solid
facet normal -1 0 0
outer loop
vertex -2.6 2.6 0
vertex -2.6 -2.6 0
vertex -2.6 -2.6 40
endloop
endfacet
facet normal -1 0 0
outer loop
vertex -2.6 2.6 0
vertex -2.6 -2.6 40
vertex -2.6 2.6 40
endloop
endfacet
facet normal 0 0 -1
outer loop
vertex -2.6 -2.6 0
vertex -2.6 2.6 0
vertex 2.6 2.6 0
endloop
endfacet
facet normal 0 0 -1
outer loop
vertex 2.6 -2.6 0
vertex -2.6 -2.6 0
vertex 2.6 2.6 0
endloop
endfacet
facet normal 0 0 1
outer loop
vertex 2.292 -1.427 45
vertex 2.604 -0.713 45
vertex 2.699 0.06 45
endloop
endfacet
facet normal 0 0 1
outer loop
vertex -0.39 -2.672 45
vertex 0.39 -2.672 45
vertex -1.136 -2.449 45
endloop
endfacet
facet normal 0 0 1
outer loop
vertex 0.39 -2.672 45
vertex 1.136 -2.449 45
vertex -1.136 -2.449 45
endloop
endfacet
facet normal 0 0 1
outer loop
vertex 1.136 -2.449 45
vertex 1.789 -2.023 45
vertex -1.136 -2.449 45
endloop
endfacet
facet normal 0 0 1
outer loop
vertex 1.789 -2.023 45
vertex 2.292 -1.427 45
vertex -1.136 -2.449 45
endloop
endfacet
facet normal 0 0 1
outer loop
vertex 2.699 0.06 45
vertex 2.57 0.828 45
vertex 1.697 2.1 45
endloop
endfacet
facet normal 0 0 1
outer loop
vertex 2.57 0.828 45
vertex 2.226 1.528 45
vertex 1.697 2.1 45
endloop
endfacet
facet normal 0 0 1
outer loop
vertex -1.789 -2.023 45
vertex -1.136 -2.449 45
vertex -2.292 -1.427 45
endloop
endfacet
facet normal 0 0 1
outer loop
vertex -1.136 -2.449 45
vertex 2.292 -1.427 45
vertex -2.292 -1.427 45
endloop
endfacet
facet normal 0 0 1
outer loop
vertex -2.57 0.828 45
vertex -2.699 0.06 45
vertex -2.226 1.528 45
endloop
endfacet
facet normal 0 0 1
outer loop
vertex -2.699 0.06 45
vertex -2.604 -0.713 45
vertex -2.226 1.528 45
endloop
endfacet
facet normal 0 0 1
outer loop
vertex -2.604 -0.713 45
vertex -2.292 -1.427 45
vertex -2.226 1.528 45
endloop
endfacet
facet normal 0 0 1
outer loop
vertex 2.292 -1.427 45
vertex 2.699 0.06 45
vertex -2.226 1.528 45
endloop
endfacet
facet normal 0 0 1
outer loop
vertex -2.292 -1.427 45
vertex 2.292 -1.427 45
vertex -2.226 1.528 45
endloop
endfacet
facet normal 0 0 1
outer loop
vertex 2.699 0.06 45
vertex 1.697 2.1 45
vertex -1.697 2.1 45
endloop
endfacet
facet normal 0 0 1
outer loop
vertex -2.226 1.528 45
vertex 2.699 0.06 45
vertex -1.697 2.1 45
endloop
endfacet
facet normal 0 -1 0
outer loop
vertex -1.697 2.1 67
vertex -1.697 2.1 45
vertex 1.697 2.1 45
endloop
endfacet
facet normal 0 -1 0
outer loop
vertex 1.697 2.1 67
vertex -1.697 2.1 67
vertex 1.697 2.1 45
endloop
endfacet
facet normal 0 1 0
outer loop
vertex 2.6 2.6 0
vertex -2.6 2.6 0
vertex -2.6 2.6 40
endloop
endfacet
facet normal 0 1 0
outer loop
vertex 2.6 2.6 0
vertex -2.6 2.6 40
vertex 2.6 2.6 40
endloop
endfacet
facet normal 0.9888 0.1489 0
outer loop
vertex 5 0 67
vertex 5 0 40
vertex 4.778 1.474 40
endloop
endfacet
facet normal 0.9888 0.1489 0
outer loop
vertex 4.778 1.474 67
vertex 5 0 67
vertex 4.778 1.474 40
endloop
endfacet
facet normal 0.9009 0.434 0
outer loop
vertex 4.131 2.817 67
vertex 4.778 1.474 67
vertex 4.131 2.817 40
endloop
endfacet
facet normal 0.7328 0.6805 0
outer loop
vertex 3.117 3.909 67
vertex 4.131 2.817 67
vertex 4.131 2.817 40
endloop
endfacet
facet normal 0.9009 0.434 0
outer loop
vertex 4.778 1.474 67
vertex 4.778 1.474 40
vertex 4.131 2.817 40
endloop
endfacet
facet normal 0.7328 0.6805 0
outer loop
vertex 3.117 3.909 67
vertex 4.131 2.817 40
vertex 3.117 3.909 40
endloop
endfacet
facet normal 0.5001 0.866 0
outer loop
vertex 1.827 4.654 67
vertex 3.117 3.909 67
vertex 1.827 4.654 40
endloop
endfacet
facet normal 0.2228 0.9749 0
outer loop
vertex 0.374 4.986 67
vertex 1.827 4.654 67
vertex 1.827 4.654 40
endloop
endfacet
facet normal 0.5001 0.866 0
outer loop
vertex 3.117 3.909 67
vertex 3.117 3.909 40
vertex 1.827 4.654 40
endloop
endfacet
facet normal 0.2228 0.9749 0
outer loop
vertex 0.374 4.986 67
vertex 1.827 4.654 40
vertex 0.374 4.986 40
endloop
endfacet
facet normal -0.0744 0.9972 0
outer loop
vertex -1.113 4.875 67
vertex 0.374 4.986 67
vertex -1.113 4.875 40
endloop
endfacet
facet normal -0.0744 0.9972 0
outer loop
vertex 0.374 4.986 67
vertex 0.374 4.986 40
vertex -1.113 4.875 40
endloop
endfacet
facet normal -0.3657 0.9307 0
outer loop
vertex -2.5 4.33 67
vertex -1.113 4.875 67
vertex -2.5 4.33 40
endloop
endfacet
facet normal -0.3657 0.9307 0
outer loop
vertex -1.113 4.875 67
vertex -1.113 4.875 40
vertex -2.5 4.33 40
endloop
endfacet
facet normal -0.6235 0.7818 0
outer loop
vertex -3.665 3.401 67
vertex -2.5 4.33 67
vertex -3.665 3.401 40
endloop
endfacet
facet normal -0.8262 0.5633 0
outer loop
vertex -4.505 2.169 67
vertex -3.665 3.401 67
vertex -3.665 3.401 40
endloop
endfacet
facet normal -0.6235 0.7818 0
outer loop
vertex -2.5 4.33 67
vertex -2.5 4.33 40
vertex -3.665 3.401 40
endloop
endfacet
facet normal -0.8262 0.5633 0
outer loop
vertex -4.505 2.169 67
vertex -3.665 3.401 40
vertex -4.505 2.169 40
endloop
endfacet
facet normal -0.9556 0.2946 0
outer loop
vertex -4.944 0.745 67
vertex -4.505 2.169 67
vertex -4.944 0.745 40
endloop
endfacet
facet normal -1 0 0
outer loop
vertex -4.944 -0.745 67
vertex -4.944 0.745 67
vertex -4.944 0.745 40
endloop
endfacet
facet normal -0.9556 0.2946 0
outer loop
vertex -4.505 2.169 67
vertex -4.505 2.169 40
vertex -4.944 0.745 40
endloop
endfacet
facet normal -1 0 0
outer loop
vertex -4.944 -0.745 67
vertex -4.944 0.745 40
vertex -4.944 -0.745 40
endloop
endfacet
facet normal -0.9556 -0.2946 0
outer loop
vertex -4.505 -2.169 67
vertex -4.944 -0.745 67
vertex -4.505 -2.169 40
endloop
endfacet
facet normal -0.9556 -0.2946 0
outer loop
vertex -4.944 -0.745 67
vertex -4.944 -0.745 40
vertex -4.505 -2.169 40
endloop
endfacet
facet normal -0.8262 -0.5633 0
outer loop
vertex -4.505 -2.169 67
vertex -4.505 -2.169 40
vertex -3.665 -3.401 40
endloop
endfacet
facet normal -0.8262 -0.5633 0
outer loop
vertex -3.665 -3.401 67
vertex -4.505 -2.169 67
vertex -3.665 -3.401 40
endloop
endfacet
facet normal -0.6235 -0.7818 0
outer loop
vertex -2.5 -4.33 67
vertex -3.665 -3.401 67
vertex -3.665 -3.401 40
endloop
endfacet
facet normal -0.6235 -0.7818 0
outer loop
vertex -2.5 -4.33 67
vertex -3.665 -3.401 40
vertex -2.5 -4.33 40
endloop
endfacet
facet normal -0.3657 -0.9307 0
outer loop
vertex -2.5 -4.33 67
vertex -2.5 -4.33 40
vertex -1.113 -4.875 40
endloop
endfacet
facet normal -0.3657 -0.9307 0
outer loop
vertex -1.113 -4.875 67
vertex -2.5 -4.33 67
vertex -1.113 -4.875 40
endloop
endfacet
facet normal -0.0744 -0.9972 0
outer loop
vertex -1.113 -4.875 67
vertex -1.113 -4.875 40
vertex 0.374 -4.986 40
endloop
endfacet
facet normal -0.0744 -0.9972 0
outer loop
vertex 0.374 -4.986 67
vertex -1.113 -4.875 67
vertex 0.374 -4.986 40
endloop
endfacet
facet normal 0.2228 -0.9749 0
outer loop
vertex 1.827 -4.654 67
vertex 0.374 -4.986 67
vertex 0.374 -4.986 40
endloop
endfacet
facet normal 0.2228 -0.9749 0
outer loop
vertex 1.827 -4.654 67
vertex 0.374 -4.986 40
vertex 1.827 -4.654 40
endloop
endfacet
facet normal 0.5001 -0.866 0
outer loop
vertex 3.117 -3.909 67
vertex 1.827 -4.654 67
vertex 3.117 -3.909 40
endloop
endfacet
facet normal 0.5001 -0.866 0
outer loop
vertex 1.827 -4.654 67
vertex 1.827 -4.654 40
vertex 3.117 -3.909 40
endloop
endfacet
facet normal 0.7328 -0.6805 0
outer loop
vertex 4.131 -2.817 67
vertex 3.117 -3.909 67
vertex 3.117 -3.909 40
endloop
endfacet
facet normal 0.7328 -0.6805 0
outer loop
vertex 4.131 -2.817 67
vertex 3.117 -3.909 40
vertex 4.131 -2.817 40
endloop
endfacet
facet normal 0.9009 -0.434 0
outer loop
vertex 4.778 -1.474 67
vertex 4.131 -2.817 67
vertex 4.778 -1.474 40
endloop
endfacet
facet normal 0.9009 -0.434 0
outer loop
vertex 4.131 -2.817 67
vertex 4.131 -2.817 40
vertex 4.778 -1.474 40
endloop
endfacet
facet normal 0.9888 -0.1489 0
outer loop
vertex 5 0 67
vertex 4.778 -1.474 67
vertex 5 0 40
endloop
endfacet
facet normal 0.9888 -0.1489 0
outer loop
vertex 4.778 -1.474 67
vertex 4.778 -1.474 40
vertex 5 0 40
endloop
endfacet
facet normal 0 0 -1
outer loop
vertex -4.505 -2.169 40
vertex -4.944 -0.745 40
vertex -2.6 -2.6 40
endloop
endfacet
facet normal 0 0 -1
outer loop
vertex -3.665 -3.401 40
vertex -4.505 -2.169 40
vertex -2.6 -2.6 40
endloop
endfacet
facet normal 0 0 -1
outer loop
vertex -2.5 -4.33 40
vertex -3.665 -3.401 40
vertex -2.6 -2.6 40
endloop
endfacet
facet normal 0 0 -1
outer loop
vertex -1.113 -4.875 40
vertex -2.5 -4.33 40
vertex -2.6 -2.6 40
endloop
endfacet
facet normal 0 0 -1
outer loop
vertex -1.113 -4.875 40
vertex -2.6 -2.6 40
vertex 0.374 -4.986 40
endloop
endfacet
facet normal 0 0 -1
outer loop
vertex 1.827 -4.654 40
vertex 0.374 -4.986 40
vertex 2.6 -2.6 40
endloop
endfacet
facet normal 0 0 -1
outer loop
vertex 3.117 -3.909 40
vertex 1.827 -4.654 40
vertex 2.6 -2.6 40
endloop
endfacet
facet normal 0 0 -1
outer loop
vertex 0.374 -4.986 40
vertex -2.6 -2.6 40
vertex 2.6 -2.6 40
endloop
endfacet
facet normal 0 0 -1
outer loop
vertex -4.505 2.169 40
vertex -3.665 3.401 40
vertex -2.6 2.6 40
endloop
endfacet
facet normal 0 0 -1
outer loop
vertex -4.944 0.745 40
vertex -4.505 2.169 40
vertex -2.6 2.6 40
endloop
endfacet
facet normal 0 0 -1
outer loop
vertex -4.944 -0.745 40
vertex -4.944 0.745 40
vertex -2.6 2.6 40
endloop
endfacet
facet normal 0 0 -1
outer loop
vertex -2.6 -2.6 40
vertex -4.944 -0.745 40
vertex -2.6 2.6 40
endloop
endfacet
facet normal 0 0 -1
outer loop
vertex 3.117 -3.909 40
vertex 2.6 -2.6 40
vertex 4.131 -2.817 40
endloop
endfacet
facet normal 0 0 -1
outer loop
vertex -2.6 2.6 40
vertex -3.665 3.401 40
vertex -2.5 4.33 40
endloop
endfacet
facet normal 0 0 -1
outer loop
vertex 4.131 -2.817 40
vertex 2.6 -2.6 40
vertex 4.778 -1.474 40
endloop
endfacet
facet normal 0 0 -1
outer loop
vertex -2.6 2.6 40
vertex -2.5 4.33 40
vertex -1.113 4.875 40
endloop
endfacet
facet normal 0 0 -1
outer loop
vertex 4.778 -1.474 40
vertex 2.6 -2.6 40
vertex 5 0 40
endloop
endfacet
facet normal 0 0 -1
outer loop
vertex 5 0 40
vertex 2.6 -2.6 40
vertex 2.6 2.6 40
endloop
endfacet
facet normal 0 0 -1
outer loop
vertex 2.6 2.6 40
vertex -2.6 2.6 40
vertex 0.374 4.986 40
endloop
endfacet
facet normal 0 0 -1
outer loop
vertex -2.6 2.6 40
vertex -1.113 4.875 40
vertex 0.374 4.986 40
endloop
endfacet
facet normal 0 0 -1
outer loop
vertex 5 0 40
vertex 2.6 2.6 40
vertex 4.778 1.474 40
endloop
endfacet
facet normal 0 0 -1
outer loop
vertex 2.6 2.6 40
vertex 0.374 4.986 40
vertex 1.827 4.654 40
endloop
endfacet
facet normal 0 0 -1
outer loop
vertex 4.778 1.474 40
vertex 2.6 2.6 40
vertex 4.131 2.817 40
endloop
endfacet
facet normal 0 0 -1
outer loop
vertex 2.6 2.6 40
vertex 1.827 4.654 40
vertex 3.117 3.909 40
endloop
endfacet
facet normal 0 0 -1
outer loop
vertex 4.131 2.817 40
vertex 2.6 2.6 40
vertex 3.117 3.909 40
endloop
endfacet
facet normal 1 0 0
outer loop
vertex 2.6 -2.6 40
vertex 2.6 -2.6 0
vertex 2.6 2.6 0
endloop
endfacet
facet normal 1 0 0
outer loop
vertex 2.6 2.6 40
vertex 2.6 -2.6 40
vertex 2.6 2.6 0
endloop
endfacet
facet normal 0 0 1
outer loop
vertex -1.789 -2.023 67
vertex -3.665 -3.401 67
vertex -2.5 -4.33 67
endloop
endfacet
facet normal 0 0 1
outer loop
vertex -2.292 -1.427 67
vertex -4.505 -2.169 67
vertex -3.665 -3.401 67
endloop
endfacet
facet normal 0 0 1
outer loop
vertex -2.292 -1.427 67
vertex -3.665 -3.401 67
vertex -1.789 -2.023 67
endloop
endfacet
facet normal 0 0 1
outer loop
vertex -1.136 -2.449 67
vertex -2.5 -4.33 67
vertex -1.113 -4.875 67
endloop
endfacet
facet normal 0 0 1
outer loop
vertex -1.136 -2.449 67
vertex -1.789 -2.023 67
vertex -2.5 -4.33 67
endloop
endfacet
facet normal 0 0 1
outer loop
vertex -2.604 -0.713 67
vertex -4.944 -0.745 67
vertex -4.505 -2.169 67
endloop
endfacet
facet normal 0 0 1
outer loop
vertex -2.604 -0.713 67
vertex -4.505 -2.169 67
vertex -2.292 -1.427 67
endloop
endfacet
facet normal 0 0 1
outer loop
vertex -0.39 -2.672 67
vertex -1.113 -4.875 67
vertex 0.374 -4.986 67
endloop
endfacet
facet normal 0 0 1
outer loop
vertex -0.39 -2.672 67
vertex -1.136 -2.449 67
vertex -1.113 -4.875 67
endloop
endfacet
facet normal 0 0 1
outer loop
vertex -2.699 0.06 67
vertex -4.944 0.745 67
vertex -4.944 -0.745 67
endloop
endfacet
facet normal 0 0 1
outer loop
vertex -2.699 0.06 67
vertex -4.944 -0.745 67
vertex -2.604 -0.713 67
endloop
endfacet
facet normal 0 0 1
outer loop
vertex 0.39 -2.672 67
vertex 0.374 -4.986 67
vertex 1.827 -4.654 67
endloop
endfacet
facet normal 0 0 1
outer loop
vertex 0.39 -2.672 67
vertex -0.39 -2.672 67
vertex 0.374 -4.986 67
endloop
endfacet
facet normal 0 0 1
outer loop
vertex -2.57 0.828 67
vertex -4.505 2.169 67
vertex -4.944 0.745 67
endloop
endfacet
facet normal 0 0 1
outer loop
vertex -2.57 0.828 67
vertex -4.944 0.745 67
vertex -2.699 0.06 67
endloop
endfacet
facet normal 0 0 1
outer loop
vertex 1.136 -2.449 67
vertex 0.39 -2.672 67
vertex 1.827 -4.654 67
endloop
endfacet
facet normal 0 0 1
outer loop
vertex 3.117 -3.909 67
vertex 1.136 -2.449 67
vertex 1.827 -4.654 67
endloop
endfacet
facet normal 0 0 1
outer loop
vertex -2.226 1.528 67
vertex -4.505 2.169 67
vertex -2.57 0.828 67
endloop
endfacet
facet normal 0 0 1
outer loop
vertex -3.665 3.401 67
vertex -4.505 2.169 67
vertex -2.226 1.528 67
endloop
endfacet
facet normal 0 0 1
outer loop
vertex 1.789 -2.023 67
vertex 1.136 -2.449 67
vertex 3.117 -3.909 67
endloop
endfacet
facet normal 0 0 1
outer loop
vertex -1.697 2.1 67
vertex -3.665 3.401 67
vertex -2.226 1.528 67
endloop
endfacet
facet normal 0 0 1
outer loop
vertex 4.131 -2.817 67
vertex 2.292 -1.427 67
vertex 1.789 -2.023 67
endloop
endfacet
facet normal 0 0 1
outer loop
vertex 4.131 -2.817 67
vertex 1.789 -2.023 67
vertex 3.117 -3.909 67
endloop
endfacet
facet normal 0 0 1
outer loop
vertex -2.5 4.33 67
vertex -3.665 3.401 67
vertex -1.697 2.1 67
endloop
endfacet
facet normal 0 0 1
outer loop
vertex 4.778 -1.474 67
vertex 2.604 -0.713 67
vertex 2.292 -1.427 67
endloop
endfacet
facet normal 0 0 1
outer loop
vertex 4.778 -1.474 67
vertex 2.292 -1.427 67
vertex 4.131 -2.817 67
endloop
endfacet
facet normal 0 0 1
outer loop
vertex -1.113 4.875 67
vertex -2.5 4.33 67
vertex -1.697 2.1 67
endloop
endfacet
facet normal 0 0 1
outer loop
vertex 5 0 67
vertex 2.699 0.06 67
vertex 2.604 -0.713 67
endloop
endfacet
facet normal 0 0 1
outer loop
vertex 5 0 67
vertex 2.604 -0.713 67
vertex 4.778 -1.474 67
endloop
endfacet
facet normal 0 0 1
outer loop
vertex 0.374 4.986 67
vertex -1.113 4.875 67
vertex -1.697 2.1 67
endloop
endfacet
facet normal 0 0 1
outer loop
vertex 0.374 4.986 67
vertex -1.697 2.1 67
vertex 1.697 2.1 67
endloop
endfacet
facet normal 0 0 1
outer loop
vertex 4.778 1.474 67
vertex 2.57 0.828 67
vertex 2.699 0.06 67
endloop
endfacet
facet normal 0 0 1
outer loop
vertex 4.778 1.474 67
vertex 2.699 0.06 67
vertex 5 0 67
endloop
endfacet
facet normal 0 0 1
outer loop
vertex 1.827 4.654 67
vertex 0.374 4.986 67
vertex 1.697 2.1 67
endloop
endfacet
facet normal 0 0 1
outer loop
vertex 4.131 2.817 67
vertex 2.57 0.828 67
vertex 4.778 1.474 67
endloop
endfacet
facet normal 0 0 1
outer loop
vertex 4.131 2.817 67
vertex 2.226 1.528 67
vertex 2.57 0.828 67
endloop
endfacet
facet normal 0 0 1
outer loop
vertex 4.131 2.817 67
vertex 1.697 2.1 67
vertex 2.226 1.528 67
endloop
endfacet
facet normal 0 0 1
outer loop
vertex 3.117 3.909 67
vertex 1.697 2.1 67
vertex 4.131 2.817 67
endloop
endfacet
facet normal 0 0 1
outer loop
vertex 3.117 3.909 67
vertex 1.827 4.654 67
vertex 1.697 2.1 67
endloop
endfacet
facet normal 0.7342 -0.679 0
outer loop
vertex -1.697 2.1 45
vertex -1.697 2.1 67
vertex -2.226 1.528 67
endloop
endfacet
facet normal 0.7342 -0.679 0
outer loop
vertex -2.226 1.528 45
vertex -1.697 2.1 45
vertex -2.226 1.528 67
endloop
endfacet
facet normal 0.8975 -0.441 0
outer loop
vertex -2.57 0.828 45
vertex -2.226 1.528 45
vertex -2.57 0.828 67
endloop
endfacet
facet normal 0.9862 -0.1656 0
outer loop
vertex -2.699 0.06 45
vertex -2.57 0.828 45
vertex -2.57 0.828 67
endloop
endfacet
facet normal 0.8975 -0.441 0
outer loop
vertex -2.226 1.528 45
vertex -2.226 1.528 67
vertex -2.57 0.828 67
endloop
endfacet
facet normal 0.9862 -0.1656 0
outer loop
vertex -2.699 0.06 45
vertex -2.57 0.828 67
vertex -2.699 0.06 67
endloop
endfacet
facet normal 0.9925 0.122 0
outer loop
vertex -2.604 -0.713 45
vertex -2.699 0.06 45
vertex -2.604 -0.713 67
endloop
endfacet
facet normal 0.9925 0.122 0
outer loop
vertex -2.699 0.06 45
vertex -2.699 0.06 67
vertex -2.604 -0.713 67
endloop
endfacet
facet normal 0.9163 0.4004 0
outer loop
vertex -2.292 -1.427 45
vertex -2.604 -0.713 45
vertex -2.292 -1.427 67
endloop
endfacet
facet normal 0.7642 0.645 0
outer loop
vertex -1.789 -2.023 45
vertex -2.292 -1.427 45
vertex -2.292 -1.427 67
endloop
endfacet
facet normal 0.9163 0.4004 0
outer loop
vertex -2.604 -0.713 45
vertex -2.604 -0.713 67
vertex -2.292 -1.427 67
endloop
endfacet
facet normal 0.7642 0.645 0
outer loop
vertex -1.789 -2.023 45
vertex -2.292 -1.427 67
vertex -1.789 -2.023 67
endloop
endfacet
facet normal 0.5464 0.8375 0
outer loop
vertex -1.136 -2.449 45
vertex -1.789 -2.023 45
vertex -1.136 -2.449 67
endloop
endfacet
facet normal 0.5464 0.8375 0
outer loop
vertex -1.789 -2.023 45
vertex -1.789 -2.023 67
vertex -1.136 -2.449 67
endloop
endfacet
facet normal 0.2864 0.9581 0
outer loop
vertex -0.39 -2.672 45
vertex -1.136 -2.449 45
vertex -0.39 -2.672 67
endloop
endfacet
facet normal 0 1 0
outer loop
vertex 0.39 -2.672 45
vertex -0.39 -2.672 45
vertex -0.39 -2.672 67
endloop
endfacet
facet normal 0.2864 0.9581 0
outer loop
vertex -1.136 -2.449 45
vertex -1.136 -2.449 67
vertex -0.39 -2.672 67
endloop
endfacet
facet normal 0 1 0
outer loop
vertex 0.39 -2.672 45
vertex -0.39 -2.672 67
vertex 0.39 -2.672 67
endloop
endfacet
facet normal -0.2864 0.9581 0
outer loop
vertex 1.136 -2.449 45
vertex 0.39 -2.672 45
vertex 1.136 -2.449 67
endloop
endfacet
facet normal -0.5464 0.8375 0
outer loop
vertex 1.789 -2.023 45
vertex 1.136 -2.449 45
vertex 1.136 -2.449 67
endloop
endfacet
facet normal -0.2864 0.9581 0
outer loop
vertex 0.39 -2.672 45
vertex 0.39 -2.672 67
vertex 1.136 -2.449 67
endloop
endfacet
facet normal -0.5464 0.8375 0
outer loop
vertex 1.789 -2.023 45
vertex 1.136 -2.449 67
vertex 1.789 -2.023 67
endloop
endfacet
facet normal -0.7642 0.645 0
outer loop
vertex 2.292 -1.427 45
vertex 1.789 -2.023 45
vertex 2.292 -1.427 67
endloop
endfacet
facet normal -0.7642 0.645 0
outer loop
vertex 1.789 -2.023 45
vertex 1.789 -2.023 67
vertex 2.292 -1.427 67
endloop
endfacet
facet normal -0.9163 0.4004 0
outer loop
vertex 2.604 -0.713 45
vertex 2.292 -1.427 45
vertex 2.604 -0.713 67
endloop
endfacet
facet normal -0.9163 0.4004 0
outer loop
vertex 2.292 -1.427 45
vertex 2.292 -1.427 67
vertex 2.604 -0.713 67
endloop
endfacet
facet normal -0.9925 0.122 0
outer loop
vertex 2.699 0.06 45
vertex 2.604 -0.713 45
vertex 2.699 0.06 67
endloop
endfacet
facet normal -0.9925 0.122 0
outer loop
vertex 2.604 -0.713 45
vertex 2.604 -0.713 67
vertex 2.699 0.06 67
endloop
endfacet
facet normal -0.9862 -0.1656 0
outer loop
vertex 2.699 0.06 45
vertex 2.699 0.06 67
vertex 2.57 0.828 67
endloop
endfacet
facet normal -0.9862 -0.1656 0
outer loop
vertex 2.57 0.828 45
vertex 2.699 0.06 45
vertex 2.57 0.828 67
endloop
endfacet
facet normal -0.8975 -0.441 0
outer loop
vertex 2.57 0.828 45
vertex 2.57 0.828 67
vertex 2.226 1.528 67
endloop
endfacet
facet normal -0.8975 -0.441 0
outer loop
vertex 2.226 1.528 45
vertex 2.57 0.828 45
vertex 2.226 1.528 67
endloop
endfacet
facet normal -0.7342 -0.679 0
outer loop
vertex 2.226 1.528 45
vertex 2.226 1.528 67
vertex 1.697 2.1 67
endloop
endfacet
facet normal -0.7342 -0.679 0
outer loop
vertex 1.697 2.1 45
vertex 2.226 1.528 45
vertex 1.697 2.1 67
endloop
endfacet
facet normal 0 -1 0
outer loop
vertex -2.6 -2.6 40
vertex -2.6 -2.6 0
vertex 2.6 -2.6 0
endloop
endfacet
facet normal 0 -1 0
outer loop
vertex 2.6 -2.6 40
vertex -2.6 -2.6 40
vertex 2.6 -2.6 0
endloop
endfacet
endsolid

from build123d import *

# Parameters (mm, degrees)
SKETCH_W     = 5.2
SKETCH_H     = 5.2
PAD_DEPTH    = 40
SKETCH001_R  = 5
PAD001_DEPTH = 27
POCKET_DEPTH = 22


with BuildPart() as part:
    # Sketch → Pad (new body)
    with BuildSketch(Plane.XY):
        Rectangle(SKETCH_W, SKETCH_H)
    extrude(amount=PAD_DEPTH)

    # Sketch001 → Pad001 (new body)
    with BuildSketch(Plane.XY.offset(40)):
        Circle(SKETCH001_R)
    extrude(amount=PAD001_DEPTH)

    # Sketch002 → Pocket (cut)
    with BuildSketch(Plane.XY.offset(67)):
        with BuildLine():
            Line((-1.697056, 2.1), (1.697056, 2.1))
            ThreePointArc((-1.697056, 2.1), (0, -2.7), (1.697056, 2.1))
        make_face()
    extrude(amount=-POCKET_DEPTH, mode=Mode.SUBTRACT)


solid = part.part
